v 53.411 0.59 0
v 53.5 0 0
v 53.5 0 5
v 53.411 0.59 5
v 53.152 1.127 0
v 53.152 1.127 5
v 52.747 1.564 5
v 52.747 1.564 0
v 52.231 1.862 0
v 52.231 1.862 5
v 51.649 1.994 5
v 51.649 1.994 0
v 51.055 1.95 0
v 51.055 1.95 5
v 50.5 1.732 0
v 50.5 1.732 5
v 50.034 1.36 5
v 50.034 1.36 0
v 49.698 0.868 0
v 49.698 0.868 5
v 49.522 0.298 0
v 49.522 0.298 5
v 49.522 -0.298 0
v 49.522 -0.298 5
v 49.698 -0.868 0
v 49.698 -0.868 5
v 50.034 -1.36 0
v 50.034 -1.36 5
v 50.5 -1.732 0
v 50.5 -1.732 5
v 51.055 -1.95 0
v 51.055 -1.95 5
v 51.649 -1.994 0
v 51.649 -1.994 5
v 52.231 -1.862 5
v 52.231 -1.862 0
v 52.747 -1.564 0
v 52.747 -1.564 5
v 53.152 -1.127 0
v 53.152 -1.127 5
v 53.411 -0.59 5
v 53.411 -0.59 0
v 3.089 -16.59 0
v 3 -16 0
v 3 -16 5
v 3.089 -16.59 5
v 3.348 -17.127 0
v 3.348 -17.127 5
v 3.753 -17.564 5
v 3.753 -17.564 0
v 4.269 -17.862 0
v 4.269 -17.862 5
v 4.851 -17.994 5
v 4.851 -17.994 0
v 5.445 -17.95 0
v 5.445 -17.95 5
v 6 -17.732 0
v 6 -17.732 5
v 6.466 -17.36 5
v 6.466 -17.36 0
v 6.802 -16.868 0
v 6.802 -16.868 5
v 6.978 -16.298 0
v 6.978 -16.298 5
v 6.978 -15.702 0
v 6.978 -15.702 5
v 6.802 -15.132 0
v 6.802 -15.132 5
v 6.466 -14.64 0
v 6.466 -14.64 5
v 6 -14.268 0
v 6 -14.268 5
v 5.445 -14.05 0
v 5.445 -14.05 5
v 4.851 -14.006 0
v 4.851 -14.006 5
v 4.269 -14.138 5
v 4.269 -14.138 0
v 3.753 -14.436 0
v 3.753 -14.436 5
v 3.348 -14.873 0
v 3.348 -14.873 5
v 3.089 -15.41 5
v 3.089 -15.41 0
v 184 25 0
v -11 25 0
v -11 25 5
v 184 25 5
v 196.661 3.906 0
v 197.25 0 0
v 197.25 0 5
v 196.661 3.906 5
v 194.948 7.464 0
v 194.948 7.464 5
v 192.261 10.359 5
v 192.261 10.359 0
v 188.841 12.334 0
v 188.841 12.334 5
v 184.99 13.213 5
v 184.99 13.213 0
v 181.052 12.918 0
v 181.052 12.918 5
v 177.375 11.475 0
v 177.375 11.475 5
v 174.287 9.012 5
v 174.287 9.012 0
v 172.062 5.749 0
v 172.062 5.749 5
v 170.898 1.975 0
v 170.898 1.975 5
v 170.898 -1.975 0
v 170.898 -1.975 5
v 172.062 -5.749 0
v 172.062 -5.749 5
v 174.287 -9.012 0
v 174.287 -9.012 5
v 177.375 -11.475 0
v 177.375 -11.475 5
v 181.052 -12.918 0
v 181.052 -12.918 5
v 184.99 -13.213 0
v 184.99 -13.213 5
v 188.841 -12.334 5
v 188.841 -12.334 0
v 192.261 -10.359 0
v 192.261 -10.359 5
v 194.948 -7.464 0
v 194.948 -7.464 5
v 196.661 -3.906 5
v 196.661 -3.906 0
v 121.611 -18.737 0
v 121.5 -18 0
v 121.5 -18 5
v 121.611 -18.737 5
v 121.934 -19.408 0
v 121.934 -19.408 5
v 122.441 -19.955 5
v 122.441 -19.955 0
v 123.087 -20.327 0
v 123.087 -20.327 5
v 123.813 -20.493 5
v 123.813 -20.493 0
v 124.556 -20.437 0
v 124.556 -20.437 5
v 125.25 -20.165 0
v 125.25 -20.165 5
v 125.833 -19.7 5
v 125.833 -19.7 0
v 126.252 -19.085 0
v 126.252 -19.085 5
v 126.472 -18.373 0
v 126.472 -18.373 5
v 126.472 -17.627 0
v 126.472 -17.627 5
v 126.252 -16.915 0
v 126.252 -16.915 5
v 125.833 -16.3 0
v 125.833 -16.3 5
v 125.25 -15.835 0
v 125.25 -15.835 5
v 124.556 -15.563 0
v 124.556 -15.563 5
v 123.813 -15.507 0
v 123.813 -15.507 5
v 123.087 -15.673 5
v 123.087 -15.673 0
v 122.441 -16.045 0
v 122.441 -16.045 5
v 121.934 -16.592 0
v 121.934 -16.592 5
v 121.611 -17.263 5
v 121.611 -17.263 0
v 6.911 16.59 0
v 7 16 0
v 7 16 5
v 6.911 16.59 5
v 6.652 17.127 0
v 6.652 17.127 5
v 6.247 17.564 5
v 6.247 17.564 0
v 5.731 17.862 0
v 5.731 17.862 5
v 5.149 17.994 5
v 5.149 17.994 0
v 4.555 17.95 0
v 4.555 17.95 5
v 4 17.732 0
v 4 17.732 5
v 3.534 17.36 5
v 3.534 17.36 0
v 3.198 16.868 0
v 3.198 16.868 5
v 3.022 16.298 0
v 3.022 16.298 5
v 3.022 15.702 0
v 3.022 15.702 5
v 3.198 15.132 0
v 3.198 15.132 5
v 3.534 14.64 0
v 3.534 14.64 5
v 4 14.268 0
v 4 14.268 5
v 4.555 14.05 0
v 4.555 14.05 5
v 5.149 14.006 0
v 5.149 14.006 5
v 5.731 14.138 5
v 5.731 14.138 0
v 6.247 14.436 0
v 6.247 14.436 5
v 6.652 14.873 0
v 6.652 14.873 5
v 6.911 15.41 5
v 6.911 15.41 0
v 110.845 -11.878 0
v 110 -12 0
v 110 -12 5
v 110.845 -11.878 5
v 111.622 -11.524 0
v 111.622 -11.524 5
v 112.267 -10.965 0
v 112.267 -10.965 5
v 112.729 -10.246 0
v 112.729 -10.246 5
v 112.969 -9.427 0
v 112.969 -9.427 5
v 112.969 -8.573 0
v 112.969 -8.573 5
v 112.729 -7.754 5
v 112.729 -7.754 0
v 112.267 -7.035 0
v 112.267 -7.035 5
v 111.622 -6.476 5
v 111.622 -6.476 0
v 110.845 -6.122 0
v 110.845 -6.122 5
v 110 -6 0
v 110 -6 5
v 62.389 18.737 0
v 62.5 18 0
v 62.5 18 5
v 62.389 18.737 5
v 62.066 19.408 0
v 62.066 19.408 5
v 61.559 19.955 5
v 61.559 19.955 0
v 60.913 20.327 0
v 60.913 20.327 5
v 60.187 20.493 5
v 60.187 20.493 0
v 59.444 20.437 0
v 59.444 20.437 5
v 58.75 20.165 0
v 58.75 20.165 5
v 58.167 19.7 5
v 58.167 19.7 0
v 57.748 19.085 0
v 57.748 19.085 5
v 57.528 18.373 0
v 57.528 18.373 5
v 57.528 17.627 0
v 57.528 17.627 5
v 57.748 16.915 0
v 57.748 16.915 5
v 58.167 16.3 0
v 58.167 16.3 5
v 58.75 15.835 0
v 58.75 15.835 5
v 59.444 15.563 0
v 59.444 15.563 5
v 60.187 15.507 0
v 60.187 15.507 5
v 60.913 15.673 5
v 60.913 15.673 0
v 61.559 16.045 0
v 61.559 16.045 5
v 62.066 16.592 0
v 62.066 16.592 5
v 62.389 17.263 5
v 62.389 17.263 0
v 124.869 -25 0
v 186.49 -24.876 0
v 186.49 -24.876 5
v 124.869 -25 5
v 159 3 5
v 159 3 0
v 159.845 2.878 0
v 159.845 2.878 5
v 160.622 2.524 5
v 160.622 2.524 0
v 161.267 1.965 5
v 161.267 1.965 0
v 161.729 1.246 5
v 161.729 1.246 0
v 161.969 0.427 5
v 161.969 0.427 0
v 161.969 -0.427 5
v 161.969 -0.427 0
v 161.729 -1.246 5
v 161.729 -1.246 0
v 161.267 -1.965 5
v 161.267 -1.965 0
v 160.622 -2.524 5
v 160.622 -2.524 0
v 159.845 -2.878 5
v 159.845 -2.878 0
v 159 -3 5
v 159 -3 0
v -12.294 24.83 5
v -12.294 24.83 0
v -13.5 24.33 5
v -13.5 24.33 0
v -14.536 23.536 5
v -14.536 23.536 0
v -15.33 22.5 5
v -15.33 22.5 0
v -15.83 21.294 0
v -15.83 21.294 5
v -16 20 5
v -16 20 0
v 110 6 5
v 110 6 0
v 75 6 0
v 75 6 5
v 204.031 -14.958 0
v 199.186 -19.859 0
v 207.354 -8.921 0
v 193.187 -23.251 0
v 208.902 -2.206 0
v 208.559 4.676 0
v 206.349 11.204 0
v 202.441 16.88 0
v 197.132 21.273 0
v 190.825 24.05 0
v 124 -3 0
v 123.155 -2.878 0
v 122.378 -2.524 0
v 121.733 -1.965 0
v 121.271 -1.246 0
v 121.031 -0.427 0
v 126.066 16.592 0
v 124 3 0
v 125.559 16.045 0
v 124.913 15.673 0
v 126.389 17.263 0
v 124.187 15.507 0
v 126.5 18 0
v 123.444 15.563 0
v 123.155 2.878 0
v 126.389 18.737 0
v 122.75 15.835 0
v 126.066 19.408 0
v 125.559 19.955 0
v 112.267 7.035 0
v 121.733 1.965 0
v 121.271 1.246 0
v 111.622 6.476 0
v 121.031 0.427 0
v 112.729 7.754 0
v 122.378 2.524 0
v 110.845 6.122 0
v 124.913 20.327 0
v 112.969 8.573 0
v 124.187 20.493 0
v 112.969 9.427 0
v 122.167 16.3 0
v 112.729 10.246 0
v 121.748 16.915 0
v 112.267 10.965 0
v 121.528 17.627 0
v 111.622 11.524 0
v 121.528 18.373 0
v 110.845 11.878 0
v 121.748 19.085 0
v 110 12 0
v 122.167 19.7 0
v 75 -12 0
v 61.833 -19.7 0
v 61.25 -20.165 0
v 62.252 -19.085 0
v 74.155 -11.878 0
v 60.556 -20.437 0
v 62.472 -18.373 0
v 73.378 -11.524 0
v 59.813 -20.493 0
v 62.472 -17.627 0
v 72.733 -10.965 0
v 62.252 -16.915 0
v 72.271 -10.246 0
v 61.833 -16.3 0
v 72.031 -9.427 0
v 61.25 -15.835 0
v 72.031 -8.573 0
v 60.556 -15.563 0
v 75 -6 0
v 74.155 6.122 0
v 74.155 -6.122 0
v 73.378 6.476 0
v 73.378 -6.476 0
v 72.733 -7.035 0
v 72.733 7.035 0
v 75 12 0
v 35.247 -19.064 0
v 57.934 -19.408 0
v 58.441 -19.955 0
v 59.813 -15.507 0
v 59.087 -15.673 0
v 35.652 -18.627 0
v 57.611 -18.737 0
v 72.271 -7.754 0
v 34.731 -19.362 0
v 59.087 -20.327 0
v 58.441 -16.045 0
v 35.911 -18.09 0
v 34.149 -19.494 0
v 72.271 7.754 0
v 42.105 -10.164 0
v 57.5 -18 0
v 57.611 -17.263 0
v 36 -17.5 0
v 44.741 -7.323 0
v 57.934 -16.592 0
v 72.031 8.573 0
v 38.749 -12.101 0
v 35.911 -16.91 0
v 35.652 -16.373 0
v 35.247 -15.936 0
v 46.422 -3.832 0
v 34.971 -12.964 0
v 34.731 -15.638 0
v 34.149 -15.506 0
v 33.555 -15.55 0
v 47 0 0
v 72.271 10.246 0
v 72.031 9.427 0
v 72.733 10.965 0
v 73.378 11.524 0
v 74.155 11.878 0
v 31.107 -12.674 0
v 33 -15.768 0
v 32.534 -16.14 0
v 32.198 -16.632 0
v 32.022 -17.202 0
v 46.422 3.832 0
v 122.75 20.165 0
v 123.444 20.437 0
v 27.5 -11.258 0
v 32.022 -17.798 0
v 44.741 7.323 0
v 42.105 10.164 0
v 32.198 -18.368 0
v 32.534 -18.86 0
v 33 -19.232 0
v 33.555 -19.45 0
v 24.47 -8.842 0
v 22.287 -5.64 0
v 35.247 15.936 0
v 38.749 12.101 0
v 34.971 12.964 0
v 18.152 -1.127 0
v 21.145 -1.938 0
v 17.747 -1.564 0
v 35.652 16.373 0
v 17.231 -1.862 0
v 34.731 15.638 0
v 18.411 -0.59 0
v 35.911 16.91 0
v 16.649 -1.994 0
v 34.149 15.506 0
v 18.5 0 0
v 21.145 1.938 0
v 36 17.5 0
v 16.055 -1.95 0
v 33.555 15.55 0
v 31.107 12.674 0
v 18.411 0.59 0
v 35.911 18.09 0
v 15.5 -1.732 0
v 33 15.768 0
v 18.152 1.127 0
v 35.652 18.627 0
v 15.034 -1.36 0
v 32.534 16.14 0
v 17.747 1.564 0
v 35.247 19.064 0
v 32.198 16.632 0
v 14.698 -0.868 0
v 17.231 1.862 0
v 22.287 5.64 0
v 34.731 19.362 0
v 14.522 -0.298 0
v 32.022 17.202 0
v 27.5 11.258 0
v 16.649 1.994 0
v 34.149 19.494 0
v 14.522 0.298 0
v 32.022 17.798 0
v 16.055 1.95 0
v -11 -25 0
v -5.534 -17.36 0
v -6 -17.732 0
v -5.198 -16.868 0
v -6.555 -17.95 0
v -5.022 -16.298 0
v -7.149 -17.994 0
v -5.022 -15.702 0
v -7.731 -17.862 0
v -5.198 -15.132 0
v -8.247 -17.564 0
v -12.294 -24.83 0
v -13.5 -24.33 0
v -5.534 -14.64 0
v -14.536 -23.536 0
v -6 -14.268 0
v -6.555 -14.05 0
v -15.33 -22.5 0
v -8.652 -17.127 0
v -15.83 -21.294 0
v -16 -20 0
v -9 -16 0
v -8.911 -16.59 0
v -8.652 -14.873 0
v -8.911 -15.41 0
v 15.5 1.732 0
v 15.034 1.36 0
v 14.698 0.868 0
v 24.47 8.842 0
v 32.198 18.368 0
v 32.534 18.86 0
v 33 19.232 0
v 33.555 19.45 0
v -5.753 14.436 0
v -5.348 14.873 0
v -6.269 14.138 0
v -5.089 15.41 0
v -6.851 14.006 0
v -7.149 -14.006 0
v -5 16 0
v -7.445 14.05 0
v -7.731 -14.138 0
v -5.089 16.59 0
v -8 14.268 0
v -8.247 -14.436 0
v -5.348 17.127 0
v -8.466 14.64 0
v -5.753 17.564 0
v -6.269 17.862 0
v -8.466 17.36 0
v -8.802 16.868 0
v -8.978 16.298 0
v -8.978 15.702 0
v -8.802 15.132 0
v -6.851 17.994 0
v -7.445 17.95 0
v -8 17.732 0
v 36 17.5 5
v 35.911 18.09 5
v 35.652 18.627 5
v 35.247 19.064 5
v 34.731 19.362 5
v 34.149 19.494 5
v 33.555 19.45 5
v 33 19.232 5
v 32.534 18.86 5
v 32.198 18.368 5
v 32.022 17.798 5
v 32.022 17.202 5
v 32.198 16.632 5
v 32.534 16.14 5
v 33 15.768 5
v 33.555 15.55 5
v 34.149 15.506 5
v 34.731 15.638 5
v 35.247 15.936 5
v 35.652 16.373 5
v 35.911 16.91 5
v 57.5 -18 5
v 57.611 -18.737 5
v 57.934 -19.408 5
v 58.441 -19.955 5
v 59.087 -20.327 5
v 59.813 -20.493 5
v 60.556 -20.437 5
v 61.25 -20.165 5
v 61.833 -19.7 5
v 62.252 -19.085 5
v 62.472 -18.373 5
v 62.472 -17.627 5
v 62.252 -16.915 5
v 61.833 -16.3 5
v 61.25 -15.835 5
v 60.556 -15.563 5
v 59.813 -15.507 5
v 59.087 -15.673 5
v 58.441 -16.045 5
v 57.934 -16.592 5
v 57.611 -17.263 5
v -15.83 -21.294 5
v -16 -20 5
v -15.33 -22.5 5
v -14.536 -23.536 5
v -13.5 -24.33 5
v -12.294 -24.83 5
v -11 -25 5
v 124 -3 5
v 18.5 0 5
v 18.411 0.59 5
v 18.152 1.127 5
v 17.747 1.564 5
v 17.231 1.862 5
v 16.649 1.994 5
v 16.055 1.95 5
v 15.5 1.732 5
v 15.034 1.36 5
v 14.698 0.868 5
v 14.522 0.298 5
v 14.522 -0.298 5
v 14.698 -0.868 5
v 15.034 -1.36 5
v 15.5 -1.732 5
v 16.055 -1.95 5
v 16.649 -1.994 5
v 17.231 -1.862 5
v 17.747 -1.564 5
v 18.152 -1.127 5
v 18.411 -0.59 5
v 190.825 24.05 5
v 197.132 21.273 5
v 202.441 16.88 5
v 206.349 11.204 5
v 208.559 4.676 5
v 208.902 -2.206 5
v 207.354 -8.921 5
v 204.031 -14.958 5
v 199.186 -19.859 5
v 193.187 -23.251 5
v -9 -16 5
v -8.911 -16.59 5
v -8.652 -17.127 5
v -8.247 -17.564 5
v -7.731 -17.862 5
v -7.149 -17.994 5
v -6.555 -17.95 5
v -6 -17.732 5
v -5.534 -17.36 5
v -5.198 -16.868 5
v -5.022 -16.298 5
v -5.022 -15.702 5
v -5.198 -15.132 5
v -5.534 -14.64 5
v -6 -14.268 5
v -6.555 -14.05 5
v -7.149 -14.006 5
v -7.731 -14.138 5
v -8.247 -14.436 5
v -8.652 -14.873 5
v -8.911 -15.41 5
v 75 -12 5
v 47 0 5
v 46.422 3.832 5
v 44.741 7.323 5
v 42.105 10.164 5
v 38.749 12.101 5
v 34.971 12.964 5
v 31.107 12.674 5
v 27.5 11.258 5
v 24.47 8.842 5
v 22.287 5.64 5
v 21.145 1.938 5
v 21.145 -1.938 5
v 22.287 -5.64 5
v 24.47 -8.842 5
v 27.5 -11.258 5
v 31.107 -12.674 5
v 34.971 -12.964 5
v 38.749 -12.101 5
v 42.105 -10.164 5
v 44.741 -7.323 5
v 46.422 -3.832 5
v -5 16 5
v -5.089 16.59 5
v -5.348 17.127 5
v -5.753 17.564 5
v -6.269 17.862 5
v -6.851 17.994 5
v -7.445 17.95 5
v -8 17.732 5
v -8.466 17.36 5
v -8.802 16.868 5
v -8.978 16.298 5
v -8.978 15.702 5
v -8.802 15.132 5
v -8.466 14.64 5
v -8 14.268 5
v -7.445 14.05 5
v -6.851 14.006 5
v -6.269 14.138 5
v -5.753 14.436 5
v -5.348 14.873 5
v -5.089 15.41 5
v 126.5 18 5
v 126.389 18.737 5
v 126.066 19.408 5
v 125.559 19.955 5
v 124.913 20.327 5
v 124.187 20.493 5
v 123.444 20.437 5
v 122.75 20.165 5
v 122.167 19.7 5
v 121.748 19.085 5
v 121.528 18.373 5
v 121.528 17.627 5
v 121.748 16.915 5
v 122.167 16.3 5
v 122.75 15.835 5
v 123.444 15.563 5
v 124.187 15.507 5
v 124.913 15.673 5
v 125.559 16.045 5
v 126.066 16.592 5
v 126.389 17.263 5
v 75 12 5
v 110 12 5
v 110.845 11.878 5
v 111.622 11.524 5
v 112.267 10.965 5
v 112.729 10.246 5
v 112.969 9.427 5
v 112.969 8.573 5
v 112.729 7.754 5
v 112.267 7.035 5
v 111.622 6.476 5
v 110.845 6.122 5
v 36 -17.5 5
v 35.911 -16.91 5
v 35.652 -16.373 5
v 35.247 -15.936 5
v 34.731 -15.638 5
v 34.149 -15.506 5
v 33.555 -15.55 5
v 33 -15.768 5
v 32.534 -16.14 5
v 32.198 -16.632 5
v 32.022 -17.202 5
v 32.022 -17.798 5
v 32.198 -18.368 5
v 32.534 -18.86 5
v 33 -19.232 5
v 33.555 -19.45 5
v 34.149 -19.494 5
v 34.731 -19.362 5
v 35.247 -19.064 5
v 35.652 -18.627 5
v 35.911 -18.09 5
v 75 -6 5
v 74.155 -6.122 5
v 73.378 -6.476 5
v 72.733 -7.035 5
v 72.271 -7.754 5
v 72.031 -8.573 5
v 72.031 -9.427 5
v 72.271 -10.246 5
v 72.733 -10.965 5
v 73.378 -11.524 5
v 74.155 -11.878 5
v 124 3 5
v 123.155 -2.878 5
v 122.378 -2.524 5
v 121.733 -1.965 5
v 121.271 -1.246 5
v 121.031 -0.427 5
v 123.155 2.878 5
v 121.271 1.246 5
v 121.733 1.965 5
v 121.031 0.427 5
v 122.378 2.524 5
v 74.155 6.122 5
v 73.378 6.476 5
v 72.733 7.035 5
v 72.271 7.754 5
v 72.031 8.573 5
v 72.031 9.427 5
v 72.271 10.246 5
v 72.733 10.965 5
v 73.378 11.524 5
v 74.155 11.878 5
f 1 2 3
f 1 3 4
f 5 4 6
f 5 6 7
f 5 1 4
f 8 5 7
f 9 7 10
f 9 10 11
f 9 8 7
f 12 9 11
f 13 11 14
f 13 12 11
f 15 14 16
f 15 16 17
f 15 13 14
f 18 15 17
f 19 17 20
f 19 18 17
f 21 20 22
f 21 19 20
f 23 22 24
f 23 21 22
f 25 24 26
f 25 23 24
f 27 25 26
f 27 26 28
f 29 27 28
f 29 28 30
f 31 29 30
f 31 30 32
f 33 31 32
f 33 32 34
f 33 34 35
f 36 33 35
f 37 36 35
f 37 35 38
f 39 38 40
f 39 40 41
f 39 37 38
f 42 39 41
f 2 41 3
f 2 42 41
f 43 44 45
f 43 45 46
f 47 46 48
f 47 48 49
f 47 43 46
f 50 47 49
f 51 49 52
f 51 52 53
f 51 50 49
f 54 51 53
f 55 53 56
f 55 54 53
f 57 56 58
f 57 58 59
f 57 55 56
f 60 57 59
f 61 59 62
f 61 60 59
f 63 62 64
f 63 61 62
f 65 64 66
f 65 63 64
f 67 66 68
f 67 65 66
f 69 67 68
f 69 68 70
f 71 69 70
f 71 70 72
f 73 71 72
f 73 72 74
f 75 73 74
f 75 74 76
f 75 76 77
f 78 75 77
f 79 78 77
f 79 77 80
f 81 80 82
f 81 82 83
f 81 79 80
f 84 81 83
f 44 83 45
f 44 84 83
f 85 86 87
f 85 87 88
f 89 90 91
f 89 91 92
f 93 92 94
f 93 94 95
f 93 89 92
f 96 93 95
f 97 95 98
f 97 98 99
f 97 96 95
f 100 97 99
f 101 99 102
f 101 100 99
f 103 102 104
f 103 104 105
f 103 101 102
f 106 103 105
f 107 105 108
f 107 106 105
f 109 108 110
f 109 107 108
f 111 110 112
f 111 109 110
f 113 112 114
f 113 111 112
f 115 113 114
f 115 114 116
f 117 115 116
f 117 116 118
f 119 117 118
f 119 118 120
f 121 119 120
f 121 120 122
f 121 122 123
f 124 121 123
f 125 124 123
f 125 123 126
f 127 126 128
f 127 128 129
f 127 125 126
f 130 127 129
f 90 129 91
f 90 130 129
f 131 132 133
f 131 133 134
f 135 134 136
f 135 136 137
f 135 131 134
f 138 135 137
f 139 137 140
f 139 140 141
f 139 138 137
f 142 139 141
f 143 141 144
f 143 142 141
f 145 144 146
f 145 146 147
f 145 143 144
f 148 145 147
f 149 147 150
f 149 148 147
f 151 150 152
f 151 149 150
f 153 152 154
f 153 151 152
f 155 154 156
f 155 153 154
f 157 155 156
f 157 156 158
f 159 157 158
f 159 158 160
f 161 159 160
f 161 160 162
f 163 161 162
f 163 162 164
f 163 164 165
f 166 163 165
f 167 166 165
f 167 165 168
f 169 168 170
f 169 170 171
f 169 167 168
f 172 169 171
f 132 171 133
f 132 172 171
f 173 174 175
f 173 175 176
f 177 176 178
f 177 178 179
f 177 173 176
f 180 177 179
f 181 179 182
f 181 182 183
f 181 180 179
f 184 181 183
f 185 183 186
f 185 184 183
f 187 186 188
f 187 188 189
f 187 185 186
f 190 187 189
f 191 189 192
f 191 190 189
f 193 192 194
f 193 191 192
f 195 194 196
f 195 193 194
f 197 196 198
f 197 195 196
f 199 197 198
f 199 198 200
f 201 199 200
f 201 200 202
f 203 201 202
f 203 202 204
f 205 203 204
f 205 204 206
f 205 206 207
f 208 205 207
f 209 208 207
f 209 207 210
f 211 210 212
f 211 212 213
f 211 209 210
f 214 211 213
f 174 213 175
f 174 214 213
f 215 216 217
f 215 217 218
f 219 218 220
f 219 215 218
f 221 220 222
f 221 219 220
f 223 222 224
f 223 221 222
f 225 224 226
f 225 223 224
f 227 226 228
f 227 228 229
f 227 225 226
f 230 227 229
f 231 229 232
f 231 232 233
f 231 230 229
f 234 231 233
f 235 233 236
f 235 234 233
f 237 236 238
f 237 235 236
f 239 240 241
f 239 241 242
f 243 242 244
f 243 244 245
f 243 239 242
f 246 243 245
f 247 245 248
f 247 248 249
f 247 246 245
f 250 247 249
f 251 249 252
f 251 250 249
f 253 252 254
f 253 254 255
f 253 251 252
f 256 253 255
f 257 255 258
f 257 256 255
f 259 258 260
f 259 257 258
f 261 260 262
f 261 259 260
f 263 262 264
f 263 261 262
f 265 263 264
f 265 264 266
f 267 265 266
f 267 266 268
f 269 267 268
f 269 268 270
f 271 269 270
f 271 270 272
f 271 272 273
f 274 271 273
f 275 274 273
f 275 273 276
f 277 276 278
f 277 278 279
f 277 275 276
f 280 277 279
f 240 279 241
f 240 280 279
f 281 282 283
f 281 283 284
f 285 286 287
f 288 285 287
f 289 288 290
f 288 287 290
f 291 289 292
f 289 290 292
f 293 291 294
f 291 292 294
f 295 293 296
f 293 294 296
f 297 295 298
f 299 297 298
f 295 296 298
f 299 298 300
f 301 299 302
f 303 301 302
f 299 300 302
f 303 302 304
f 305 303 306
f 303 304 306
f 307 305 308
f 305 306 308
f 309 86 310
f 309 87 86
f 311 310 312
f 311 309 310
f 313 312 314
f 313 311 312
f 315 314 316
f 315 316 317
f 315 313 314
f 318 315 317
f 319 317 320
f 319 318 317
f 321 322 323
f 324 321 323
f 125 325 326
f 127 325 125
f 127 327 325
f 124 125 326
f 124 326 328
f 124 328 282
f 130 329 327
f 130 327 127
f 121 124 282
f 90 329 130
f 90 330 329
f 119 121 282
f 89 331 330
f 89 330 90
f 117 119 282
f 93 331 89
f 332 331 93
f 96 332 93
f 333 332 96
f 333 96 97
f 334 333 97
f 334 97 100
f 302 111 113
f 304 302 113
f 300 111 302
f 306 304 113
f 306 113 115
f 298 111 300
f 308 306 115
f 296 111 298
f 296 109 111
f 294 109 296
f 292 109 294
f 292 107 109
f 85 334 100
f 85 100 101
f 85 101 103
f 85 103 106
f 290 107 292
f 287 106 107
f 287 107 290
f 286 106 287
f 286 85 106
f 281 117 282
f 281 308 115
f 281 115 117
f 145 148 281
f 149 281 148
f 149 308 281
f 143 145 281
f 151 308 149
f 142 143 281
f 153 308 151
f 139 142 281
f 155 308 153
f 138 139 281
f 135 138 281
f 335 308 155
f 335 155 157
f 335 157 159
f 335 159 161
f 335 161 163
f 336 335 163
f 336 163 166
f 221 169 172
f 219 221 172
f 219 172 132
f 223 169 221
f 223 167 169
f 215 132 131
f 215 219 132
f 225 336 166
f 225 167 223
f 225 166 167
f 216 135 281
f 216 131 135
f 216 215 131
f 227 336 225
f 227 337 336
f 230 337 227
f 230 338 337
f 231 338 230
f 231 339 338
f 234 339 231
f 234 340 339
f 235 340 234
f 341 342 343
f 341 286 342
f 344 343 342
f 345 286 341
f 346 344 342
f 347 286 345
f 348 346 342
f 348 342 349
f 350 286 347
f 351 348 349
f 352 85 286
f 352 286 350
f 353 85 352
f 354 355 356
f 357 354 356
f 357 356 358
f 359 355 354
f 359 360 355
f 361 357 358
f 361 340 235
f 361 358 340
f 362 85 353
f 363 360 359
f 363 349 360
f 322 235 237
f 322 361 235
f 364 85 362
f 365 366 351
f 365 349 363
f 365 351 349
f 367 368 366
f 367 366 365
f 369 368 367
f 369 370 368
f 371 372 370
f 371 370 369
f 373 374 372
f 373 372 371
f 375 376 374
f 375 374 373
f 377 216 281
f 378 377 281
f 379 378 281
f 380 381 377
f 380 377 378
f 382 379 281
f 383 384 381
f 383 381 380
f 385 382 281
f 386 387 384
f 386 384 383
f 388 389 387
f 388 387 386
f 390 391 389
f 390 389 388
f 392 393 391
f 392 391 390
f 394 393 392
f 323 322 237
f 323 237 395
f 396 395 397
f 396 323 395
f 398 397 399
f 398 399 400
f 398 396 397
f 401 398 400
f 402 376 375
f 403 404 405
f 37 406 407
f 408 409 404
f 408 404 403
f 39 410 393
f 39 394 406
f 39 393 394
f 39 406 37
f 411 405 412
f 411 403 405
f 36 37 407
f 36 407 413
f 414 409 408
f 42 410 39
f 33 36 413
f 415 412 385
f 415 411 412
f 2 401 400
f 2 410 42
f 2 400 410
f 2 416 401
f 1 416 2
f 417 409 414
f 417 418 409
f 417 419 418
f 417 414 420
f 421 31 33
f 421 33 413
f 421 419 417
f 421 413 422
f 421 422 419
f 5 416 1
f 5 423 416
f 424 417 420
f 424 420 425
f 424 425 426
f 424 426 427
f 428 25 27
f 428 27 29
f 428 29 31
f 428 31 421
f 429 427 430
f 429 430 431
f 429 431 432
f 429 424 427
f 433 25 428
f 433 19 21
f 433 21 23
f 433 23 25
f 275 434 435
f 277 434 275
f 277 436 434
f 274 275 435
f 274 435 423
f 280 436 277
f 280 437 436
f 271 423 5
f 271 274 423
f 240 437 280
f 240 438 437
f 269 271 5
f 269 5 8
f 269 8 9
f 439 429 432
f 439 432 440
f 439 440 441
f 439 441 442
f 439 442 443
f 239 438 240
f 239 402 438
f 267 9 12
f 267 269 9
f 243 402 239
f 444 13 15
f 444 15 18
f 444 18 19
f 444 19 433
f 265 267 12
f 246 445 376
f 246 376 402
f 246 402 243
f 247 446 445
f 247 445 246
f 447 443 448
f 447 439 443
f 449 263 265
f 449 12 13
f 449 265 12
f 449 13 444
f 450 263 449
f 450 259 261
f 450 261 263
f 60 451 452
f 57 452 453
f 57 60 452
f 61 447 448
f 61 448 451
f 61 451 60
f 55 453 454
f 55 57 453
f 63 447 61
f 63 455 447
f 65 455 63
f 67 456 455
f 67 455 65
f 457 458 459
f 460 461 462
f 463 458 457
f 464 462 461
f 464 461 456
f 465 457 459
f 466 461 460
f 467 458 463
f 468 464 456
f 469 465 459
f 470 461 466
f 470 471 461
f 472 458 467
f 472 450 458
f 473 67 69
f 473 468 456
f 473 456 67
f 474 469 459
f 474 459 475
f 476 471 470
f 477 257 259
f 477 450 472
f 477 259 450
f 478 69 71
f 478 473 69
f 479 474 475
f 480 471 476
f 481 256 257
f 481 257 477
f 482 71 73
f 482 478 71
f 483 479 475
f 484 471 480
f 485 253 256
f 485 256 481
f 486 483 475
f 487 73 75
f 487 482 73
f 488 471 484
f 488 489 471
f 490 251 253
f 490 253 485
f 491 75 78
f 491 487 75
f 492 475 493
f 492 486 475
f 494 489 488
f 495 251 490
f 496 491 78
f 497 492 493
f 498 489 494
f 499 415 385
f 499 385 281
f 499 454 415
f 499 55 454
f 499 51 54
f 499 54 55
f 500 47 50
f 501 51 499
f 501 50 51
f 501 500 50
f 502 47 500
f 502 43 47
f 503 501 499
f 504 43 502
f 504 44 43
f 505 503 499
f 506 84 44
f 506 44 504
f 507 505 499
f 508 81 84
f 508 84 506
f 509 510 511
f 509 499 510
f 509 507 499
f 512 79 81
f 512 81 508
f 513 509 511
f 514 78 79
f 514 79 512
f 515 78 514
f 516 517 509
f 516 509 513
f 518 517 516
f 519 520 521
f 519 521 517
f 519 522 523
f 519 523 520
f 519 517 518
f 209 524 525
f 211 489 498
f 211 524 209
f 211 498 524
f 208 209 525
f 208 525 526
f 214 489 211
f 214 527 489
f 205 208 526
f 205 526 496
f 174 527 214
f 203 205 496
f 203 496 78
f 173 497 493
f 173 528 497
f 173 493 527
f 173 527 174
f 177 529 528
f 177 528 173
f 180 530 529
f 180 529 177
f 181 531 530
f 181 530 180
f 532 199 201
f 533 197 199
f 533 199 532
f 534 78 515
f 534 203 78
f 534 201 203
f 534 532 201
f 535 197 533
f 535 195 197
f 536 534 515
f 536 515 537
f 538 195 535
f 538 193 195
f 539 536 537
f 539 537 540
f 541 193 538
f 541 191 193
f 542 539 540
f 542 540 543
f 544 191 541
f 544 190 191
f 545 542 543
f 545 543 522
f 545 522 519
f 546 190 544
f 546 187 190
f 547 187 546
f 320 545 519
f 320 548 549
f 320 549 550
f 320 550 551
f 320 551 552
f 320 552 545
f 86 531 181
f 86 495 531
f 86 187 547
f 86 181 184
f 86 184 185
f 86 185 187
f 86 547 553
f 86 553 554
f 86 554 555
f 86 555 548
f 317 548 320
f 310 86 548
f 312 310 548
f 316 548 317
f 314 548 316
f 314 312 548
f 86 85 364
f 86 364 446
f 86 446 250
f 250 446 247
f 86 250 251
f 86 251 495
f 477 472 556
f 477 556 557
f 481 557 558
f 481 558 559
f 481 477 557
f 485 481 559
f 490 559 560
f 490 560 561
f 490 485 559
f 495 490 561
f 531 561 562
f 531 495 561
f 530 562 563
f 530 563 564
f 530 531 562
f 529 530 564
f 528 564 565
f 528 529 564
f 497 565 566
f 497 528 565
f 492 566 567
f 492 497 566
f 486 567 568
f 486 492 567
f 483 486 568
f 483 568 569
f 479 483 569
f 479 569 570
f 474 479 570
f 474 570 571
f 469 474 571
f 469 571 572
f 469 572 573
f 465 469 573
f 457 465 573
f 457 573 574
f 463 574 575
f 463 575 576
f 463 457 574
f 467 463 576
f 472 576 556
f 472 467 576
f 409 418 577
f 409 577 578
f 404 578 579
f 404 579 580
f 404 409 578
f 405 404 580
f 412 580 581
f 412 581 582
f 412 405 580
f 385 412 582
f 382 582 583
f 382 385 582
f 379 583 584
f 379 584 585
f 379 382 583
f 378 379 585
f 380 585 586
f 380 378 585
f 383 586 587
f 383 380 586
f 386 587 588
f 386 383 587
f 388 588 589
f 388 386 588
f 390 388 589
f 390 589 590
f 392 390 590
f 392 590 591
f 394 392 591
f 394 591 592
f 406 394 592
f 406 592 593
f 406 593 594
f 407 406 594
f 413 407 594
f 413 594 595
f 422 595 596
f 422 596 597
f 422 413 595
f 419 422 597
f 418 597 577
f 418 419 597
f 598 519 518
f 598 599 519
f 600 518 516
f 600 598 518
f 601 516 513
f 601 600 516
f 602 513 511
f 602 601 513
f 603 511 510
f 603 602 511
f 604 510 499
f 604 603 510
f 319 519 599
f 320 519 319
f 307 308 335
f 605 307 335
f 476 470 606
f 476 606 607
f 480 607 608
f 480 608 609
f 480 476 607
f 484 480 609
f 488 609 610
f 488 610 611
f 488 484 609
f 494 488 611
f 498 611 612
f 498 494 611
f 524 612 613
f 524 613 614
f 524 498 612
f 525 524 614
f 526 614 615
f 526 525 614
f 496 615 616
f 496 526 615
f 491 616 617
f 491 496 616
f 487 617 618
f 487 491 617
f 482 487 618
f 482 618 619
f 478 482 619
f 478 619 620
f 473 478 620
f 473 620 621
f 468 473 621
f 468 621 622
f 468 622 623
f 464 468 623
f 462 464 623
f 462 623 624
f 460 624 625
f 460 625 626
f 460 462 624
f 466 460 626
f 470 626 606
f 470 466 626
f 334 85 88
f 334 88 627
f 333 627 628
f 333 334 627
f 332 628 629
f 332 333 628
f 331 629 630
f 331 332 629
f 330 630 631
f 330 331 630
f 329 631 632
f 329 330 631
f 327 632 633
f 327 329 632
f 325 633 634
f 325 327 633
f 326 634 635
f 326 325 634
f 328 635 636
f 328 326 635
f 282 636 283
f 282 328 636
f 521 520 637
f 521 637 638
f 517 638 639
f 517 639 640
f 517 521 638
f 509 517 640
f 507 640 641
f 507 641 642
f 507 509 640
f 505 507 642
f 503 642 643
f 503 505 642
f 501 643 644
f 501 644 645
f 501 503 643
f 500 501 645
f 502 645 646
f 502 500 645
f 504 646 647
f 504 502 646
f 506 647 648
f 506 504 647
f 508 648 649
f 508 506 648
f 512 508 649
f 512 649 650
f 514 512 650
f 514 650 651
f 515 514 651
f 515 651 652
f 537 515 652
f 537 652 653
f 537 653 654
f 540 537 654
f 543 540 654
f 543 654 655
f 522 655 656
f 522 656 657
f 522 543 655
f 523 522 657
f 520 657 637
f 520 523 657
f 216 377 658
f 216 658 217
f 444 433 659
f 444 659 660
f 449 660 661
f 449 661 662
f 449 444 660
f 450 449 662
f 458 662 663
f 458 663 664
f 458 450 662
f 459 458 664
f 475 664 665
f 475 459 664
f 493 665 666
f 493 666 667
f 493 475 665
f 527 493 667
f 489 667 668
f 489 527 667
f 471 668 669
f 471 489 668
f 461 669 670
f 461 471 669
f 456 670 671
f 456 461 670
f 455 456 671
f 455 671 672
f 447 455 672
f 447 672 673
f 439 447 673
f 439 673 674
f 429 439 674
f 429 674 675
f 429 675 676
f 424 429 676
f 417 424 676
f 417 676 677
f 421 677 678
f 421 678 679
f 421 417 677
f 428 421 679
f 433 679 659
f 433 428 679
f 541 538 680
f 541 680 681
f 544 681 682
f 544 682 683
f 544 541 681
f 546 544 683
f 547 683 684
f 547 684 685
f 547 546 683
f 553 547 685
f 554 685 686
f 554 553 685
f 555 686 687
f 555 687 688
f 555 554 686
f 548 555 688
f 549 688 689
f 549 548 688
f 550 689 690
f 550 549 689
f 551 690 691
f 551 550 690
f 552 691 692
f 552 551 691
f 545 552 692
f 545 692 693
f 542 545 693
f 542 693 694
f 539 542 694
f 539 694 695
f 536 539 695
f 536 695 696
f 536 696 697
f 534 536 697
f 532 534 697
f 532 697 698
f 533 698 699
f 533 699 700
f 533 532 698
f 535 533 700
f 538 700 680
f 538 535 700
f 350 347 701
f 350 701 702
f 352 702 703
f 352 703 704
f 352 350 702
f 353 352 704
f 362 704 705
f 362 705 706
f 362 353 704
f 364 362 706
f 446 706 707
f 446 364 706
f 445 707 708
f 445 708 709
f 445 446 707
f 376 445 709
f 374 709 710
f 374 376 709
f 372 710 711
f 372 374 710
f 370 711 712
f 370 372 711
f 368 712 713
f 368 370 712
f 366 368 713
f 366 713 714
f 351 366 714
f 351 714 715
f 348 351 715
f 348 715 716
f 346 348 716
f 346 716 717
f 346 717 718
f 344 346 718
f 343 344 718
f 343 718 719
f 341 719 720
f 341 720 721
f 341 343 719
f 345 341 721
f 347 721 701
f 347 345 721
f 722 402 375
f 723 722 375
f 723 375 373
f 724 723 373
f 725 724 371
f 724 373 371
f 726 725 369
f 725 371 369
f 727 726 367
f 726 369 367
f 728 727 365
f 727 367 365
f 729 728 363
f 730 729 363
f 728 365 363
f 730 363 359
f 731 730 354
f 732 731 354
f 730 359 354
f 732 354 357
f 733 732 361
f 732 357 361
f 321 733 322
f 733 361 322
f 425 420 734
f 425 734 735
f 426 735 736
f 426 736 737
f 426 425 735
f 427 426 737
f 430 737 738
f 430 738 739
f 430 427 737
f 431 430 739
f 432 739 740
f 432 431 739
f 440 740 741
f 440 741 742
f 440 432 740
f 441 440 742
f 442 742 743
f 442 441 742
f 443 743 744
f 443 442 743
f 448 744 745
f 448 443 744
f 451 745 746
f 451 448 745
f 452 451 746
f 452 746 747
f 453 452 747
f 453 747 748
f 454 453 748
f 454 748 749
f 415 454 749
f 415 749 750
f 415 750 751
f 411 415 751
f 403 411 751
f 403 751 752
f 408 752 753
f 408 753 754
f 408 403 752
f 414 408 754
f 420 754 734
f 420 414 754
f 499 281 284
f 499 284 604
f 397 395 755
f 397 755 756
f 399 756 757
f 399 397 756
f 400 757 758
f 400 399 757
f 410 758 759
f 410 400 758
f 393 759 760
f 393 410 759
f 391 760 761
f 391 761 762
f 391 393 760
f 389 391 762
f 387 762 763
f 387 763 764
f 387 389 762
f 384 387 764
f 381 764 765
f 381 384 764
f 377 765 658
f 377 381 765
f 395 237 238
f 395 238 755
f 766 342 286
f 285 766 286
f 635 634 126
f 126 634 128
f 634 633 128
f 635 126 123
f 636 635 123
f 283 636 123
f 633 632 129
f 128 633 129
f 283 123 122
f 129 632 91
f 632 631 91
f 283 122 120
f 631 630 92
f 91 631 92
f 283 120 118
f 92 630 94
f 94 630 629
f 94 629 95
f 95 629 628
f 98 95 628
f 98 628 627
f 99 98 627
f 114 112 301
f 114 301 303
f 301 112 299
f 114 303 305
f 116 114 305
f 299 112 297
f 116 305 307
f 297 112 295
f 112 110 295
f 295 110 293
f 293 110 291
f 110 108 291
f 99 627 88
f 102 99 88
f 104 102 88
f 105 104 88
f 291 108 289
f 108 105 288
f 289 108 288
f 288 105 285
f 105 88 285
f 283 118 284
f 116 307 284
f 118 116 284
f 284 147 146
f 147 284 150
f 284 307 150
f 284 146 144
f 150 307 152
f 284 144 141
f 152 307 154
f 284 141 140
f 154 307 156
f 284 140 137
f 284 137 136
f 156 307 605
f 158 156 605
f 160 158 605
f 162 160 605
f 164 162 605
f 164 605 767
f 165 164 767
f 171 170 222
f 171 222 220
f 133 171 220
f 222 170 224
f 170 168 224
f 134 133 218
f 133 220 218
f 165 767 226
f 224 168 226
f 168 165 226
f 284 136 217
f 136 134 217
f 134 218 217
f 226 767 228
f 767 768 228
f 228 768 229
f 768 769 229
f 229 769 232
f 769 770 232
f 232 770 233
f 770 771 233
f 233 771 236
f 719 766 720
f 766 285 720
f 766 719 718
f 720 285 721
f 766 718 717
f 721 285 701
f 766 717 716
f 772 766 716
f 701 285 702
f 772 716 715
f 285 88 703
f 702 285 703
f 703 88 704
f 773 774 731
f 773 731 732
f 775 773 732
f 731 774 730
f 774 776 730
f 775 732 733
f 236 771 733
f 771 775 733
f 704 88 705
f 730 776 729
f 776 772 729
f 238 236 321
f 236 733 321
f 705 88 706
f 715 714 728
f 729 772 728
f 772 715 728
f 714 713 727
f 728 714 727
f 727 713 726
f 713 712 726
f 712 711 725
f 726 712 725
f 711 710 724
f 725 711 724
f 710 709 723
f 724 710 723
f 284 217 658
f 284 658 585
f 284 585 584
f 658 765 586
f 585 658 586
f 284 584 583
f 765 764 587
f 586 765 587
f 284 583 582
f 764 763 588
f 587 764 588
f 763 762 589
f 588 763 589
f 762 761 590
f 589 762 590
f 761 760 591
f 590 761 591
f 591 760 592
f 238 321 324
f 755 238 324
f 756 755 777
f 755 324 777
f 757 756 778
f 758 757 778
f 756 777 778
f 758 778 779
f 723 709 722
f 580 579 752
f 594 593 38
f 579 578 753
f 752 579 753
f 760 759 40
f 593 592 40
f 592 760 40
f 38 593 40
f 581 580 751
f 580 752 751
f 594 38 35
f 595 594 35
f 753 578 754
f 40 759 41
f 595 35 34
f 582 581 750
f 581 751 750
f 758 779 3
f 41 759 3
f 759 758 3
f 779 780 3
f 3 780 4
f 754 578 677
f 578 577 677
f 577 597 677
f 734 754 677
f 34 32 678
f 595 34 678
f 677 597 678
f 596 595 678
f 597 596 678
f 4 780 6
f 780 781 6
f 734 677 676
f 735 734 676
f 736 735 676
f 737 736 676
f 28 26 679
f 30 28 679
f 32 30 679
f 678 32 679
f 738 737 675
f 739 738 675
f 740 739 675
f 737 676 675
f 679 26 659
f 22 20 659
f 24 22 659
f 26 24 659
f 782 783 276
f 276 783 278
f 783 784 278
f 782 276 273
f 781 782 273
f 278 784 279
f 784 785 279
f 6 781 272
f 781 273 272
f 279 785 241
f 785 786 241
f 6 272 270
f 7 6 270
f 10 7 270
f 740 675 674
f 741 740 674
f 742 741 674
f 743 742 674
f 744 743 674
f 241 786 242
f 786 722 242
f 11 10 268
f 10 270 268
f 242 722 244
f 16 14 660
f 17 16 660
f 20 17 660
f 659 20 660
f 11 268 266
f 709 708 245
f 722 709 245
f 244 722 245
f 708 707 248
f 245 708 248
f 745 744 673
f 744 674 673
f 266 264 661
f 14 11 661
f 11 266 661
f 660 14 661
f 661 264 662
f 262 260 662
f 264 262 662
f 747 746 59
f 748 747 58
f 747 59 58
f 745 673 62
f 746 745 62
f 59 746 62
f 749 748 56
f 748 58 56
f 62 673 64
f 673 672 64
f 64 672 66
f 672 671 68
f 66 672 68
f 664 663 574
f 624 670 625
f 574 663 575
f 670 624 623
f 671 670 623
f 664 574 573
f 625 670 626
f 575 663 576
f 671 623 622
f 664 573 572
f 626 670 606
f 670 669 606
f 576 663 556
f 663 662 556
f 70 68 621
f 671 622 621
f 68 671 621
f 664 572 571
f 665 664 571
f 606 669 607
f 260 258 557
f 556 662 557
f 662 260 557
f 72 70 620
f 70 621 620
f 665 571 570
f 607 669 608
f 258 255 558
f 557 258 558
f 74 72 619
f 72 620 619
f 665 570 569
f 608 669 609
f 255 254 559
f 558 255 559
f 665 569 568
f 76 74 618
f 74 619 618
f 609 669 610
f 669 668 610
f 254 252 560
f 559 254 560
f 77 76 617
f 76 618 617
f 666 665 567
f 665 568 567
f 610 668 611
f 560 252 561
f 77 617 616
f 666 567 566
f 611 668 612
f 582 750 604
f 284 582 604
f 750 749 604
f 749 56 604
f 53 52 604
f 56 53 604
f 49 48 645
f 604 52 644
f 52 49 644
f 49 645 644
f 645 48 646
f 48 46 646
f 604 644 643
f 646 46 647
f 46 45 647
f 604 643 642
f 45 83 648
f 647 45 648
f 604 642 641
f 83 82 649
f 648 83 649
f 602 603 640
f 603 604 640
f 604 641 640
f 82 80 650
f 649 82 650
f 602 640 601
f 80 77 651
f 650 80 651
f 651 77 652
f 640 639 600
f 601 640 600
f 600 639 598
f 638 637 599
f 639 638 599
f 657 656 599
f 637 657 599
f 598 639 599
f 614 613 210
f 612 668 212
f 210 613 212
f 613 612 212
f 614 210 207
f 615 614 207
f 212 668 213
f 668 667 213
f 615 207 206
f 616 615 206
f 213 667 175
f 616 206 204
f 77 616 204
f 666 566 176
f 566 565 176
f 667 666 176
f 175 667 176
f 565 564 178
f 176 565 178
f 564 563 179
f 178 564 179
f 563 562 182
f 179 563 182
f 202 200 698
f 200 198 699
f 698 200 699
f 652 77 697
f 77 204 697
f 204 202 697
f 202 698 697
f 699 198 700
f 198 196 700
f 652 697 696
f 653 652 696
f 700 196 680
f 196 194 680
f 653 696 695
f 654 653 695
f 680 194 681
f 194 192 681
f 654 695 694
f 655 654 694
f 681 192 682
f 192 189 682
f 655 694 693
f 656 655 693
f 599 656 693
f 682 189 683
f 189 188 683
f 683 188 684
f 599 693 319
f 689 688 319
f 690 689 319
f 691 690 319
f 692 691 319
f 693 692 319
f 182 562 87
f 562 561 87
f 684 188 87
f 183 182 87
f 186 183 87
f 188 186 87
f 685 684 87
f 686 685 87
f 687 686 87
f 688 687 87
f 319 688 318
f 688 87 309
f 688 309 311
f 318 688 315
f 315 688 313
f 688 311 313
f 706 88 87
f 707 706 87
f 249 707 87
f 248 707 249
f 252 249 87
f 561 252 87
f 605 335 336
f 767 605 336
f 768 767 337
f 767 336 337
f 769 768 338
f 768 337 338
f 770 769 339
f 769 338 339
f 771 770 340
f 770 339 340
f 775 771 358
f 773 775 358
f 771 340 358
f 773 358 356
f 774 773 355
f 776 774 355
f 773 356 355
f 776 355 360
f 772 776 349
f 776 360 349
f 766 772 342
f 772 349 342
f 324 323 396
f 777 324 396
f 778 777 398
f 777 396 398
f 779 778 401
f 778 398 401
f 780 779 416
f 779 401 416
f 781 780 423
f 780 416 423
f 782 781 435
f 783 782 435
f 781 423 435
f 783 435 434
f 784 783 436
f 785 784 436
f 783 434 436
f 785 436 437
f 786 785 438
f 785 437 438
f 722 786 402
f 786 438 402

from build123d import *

# Parameters (mm, degrees)
SKETCH_1_R      = 13.25
SKETCH_1_R_2    = 2
SKETCH_1_R_3    = 2.5
SKETCH_1_R_4    = 13
EXTRUDE_1_DEPTH = 5
FILLET_1_R      = 5


with BuildPart() as part:
    # 草图1 → 凸台-拉伸1 (new body)
    with BuildSketch(Plane.XY):
        with BuildLine():
            Line((0, 25), (124.869292101, 25))
            Line((124.869292101, 25), (184, 25))
            ThreePointArc((184, 25), (208.968890762, 1.246793543), (186.490484142, -24.875640469))
            Line((186.490484142, -24.875640469), (124.869292101, -25))
            Line((124.869292101, -25), (0, -25))
            Line((0, -25), (-16, -25))
            Line((-16, -25), (-16, 25))
            Line((-16, 25), (0, 25))
        make_face()
        with Locations((184, 0)):
            Circle(SKETCH_1_R, mode=Mode.SUBTRACT)
        with Locations((5, 16)):
            Circle(SKETCH_1_R_2, mode=Mode.SUBTRACT)
        with Locations(Location((5, -16, 0), (0, 0, 180))):
            Circle(SKETCH_1_R_2, mode=Mode.SUBTRACT)
        with Locations((60, 18)):
            Circle(SKETCH_1_R_3, mode=Mode.SUBTRACT)
        with Locations((124, 18)):
            Circle(SKETCH_1_R_3, mode=Mode.SUBTRACT)
        with Locations((34, 0)):
            Circle(SKETCH_1_R_4, mode=Mode.SUBTRACT)
        with Locations((34, 17.5)):
            Circle(SKETCH_1_R_2, mode=Mode.SUBTRACT)
        with Locations(Location((124, -18, 0), (0, 0, 180))):
            Circle(SKETCH_1_R_3, mode=Mode.SUBTRACT)
        with Locations(Location((60, -18, 0), (0, 0, 180))):
            Circle(SKETCH_1_R_3, mode=Mode.SUBTRACT)
        with Locations((51.5, 0)):
            Circle(SKETCH_1_R_2, mode=Mode.SUBTRACT)
        with Locations((34, -17.5)):
            Circle(SKETCH_1_R_2, mode=Mode.SUBTRACT)
        with Locations((16.5, 0)):
            Circle(SKETCH_1_R_2, mode=Mode.SUBTRACT)
        with Locations((-7, 16)):
            Circle(SKETCH_1_R_2, mode=Mode.SUBTRACT)
        with Locations(Location((-7, -16, 0), (0, 0, 180))):
            Circle(SKETCH_1_R_2, mode=Mode.SUBTRACT)
        with BuildLine():
            Line((75, -12), (110, -12))
            ThreePointArc((110, -12), (113, -9), (110, -6))
            Line((110, -6), (75, -6))
            ThreePointArc((75, -6), (72, -9), (75, -12))
        make_face(mode=Mode.SUBTRACT)
        with BuildLine():
            Line((124, 3), (159, 3))
            ThreePointArc((159, 3), (162, 0), (159, -3))
            Line((159, -3), (124, -3))
            ThreePointArc((124, -3), (121, 0), (124, 3))
        make_face(mode=Mode.SUBTRACT)
        with BuildLine():
            Line((75, 12), (110, 12))
            ThreePointArc((110, 12), (113, 9), (110, 6))
            Line((110, 6), (75, 6))
            ThreePointArc((75, 6), (72, 9), (75, 12))
        make_face(mode=Mode.SUBTRACT)
    extrude(amount=EXTRUDE_1_DEPTH)

    # 圆角1
    fillet_1_edges = [part.edges().sort_by_distance(p)[0] for p in [
        (-16, -25, 2.5),
        (-16, 25, 2.5),
    ]]
    fillet(fillet_1_edges, radius=FILLET_1_R)


solid = part.part
